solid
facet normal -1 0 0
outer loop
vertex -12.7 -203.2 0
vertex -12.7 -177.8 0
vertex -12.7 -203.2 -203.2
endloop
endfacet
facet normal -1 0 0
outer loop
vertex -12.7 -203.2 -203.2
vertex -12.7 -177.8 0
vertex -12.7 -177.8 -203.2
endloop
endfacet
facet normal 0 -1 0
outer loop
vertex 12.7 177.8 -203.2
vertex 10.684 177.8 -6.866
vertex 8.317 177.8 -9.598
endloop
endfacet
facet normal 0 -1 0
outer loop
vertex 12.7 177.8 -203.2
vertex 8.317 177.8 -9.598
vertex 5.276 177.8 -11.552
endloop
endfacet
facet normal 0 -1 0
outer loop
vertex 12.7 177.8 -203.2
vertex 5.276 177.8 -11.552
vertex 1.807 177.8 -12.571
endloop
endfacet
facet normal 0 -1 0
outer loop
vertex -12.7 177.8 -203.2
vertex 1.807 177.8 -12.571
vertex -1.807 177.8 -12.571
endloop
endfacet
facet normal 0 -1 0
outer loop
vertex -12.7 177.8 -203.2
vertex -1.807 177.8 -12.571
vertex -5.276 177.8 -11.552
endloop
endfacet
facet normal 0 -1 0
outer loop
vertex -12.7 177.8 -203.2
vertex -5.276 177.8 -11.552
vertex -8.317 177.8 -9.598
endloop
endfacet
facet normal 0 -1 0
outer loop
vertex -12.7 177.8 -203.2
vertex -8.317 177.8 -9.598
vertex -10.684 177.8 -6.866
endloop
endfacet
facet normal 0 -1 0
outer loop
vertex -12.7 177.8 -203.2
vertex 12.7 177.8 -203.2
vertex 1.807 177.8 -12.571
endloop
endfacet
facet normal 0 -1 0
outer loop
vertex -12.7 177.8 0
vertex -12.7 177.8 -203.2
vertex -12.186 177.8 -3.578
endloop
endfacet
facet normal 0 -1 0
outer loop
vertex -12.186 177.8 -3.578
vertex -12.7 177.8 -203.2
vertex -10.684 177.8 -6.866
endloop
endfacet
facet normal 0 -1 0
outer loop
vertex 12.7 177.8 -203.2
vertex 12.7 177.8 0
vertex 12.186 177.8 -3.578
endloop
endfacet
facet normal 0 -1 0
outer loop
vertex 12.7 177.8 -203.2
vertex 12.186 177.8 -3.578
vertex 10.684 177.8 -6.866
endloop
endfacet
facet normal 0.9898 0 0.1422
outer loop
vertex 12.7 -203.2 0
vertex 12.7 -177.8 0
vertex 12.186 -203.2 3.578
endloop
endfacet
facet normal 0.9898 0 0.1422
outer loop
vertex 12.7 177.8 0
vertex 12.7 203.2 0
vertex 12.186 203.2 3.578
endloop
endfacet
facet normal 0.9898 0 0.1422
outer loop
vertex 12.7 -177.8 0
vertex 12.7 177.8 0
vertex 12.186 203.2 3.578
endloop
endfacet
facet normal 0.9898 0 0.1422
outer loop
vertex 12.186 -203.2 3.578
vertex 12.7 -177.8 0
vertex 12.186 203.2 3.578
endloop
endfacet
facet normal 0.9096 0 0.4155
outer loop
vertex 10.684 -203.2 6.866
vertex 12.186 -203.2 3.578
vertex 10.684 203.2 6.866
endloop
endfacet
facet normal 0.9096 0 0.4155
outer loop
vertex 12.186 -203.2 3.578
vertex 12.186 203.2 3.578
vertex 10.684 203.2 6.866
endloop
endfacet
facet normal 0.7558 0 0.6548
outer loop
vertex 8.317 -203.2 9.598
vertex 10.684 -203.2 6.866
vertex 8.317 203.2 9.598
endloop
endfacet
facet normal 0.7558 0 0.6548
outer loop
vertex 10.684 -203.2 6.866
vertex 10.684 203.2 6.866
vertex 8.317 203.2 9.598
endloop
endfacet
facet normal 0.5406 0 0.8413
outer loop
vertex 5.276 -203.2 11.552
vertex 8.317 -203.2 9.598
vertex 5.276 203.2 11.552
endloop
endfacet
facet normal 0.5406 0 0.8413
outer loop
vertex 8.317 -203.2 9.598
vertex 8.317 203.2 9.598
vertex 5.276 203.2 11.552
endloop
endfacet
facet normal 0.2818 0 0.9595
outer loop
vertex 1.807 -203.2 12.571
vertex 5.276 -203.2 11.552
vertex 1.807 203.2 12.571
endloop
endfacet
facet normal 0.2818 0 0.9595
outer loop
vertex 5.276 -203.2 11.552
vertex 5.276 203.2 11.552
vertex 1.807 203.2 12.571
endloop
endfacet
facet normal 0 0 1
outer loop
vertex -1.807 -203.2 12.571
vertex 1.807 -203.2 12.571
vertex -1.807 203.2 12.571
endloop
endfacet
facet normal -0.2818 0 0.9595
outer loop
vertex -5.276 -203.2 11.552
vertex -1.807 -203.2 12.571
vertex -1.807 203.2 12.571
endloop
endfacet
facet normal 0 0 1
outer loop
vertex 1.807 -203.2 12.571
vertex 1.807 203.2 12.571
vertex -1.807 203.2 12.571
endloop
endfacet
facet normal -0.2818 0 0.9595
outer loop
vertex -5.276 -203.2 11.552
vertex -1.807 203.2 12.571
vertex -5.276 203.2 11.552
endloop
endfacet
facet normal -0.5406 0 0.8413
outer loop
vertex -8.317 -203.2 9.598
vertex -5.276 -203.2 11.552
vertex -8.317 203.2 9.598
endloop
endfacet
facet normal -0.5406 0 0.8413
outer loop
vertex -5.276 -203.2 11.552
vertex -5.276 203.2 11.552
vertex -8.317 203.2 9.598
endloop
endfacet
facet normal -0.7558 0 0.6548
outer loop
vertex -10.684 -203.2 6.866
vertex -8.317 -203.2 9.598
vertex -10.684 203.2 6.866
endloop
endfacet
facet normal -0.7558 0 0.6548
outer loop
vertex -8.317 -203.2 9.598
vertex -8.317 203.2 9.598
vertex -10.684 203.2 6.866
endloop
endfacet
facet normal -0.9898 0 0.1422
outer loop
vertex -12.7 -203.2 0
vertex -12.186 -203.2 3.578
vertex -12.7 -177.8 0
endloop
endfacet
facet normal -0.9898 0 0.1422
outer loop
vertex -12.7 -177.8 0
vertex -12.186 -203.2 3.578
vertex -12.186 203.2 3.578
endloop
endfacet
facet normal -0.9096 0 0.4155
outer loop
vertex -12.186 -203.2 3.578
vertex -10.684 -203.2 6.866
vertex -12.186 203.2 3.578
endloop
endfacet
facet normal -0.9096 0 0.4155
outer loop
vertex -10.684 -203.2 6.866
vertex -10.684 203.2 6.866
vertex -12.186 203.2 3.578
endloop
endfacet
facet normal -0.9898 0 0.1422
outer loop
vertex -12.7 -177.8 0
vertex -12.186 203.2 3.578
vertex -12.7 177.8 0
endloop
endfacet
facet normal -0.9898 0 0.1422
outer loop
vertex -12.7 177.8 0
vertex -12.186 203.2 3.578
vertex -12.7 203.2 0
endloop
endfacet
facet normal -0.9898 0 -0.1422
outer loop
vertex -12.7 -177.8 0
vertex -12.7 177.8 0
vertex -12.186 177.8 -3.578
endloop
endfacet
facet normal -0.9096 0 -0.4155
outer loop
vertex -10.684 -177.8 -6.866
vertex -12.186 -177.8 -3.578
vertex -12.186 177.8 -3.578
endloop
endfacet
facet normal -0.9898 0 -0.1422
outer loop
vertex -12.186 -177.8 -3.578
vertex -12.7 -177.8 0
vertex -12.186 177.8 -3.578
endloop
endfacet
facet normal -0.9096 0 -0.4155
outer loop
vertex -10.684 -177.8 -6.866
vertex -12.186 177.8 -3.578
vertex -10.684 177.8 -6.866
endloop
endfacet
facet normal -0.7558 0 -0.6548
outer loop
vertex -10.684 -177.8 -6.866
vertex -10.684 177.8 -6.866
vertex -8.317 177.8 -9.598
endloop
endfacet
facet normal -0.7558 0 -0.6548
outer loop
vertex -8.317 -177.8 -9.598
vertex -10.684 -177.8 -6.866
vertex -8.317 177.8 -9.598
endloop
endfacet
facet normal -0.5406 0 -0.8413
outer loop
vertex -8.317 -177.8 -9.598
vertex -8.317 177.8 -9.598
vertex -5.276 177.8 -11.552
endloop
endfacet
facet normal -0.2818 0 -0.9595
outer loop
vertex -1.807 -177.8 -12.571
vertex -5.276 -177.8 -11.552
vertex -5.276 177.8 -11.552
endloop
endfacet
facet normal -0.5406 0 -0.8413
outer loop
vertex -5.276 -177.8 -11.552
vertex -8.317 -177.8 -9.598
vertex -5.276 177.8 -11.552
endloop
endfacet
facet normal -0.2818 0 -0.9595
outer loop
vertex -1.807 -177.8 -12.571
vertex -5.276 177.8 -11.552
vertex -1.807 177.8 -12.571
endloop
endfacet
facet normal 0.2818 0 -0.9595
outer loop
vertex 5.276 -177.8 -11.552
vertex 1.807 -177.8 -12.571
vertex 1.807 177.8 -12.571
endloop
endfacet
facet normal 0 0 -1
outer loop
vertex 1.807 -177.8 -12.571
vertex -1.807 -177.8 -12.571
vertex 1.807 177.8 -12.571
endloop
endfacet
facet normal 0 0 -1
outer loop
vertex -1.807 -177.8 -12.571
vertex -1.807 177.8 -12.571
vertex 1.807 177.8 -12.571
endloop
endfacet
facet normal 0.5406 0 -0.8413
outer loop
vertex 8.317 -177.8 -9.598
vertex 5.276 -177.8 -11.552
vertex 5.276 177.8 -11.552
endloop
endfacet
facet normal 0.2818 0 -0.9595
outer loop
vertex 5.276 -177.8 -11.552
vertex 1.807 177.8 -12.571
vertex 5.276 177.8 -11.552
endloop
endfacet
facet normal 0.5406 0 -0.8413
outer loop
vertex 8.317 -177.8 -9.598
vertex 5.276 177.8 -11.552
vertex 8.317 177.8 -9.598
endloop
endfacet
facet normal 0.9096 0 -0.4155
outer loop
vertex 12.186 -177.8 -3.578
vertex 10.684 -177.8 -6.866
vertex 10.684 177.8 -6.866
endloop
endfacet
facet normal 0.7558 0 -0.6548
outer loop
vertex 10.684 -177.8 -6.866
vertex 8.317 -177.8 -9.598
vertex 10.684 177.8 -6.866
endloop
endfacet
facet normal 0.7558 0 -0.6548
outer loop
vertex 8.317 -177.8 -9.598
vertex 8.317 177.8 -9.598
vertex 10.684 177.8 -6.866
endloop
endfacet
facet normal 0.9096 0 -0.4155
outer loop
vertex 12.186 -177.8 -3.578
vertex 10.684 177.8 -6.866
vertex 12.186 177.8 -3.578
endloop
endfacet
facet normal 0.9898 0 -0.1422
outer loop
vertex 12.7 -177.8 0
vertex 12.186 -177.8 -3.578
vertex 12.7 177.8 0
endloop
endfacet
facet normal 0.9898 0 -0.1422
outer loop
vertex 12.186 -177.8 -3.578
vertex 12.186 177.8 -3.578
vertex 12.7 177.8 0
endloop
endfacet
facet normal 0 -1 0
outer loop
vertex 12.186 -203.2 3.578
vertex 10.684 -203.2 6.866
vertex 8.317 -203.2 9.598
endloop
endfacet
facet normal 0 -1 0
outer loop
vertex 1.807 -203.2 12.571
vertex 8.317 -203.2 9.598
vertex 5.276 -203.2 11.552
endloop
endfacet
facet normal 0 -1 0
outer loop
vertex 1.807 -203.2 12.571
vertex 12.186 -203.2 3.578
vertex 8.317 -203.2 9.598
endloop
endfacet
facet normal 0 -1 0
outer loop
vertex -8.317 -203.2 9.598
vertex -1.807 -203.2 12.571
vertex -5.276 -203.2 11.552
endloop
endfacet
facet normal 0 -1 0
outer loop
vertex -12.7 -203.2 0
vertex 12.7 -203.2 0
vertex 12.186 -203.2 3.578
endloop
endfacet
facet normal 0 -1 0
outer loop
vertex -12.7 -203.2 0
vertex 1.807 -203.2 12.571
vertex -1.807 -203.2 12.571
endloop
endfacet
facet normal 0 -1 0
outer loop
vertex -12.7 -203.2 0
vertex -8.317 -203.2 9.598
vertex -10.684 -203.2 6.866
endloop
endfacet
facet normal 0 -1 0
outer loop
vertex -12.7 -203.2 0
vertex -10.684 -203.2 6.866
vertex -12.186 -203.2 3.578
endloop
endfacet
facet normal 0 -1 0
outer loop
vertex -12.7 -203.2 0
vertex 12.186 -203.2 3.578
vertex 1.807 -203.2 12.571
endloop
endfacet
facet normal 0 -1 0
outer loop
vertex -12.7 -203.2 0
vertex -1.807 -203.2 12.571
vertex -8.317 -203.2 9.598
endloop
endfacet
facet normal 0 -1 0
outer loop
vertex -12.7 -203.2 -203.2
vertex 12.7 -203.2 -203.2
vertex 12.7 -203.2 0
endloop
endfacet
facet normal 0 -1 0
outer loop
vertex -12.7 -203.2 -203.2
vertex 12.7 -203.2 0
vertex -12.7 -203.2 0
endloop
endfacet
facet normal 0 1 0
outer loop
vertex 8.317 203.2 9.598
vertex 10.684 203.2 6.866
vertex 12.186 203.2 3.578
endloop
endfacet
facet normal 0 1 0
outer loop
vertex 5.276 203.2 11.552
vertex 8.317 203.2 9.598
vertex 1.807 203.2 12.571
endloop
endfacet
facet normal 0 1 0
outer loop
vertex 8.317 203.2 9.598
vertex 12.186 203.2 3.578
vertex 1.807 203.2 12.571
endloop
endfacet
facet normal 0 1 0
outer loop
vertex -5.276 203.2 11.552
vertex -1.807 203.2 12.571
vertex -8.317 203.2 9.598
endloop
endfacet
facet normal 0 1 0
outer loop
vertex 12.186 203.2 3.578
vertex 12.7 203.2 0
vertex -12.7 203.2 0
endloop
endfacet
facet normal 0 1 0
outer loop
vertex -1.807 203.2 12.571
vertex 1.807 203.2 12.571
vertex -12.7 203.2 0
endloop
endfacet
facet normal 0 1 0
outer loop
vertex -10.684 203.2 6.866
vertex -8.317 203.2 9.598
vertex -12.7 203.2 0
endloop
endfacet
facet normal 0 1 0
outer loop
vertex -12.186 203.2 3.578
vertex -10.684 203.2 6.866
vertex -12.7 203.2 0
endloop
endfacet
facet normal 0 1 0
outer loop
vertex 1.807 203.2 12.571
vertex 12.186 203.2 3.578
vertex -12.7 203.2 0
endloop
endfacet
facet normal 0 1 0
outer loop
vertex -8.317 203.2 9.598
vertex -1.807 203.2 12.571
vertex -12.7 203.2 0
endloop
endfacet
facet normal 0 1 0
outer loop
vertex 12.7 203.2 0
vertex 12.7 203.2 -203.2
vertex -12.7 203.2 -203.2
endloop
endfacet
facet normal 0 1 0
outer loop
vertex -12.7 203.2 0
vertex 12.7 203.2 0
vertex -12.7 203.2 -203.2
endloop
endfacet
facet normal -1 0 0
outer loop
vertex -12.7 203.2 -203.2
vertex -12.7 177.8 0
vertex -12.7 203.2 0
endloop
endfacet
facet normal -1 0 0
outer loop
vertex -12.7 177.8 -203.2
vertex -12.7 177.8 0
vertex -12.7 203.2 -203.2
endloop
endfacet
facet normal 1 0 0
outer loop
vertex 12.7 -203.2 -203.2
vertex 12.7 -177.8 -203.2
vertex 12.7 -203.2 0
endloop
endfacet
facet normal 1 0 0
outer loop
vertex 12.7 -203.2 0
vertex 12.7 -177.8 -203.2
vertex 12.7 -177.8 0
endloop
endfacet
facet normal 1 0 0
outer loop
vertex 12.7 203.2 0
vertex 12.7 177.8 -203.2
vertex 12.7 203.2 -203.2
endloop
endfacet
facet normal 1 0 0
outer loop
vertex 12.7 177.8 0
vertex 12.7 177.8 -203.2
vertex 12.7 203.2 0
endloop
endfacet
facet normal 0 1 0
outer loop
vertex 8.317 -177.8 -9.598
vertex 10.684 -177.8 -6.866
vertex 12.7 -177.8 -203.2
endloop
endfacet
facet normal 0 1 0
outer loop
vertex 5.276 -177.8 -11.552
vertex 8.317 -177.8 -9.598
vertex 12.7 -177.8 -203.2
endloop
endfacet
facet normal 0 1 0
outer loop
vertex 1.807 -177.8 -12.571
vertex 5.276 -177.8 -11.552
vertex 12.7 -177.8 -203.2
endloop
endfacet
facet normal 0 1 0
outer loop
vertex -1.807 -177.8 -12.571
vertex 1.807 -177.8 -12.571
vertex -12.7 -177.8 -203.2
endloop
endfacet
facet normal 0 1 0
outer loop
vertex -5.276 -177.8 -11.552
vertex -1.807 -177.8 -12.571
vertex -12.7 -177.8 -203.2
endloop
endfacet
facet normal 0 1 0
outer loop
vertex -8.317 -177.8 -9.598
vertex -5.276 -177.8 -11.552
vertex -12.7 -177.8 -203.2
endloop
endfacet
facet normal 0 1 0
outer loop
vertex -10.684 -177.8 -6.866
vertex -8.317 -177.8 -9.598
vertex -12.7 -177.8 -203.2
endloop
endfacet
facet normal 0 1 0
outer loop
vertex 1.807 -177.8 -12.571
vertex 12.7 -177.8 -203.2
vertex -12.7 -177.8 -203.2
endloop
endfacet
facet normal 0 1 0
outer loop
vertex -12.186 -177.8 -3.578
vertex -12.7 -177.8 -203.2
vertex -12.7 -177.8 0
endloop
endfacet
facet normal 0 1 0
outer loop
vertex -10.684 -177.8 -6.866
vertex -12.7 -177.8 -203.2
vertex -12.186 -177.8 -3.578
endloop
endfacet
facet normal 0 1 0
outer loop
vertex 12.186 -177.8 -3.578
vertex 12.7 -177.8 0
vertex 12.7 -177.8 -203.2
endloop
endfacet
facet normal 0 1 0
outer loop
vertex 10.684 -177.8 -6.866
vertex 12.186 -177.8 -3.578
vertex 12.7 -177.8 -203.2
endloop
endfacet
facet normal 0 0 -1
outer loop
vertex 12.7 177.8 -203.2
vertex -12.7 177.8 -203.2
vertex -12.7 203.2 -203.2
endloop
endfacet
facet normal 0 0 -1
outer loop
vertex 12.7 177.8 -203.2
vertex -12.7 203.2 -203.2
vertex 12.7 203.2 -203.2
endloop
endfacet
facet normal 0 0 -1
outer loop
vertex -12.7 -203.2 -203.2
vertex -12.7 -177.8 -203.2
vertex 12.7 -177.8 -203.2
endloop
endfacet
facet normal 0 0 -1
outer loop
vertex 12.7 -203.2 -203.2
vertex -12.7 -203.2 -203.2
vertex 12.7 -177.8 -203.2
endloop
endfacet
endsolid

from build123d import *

# Parameters (mm, degrees)
SKETCH1_R           = 12.7
BOSS_EXTRUDE1_DEPTH = 177.8
BOSS_EXTRUDE2_DEPTH = 25.4


with BuildPart() as part:
    # Sketch1 → Boss-Extrude1 (new body)
    with BuildSketch(Plane(origin=(0, 0, 0), x_dir=(1, 0, 0), z_dir=(0, 1, 0))):
        Circle(SKETCH1_R)
    boss_extrude1 = extrude(amount=BOSS_EXTRUDE1_DEPTH)

    # Sketch2 → Boss-Extrude2 (add)
    with BuildSketch(Plane(origin=(0, 177.8, 0), x_dir=(1, 0, 0), z_dir=(0, 1, 0))):
        with BuildLine():
            Line((-12.7, 0), (-12.7, 203.2))
            Line((-12.7, 203.2), (12.7, 203.2))
            Line((12.7, 203.2), (12.7, 0))
            ThreePointArc((12.7, 0), (0, -12.7), (-12.7, 0))
        make_face()
    boss_extrude2 = extrude(amount=BOSS_EXTRUDE2_DEPTH)

    # Mirror1: Boss-Extrude1, Boss-Extrude2 across plane
    add(boss_extrude1.mirror(Plane(origin=(0, 0, 0), x_dir=(0, 0, 1), z_dir=(0, -1, 0))))
    add(boss_extrude2.mirror(Plane(origin=(0, 0, 0), x_dir=(0, 0, 1), z_dir=(0, -1, 0))))


solid = part.part
